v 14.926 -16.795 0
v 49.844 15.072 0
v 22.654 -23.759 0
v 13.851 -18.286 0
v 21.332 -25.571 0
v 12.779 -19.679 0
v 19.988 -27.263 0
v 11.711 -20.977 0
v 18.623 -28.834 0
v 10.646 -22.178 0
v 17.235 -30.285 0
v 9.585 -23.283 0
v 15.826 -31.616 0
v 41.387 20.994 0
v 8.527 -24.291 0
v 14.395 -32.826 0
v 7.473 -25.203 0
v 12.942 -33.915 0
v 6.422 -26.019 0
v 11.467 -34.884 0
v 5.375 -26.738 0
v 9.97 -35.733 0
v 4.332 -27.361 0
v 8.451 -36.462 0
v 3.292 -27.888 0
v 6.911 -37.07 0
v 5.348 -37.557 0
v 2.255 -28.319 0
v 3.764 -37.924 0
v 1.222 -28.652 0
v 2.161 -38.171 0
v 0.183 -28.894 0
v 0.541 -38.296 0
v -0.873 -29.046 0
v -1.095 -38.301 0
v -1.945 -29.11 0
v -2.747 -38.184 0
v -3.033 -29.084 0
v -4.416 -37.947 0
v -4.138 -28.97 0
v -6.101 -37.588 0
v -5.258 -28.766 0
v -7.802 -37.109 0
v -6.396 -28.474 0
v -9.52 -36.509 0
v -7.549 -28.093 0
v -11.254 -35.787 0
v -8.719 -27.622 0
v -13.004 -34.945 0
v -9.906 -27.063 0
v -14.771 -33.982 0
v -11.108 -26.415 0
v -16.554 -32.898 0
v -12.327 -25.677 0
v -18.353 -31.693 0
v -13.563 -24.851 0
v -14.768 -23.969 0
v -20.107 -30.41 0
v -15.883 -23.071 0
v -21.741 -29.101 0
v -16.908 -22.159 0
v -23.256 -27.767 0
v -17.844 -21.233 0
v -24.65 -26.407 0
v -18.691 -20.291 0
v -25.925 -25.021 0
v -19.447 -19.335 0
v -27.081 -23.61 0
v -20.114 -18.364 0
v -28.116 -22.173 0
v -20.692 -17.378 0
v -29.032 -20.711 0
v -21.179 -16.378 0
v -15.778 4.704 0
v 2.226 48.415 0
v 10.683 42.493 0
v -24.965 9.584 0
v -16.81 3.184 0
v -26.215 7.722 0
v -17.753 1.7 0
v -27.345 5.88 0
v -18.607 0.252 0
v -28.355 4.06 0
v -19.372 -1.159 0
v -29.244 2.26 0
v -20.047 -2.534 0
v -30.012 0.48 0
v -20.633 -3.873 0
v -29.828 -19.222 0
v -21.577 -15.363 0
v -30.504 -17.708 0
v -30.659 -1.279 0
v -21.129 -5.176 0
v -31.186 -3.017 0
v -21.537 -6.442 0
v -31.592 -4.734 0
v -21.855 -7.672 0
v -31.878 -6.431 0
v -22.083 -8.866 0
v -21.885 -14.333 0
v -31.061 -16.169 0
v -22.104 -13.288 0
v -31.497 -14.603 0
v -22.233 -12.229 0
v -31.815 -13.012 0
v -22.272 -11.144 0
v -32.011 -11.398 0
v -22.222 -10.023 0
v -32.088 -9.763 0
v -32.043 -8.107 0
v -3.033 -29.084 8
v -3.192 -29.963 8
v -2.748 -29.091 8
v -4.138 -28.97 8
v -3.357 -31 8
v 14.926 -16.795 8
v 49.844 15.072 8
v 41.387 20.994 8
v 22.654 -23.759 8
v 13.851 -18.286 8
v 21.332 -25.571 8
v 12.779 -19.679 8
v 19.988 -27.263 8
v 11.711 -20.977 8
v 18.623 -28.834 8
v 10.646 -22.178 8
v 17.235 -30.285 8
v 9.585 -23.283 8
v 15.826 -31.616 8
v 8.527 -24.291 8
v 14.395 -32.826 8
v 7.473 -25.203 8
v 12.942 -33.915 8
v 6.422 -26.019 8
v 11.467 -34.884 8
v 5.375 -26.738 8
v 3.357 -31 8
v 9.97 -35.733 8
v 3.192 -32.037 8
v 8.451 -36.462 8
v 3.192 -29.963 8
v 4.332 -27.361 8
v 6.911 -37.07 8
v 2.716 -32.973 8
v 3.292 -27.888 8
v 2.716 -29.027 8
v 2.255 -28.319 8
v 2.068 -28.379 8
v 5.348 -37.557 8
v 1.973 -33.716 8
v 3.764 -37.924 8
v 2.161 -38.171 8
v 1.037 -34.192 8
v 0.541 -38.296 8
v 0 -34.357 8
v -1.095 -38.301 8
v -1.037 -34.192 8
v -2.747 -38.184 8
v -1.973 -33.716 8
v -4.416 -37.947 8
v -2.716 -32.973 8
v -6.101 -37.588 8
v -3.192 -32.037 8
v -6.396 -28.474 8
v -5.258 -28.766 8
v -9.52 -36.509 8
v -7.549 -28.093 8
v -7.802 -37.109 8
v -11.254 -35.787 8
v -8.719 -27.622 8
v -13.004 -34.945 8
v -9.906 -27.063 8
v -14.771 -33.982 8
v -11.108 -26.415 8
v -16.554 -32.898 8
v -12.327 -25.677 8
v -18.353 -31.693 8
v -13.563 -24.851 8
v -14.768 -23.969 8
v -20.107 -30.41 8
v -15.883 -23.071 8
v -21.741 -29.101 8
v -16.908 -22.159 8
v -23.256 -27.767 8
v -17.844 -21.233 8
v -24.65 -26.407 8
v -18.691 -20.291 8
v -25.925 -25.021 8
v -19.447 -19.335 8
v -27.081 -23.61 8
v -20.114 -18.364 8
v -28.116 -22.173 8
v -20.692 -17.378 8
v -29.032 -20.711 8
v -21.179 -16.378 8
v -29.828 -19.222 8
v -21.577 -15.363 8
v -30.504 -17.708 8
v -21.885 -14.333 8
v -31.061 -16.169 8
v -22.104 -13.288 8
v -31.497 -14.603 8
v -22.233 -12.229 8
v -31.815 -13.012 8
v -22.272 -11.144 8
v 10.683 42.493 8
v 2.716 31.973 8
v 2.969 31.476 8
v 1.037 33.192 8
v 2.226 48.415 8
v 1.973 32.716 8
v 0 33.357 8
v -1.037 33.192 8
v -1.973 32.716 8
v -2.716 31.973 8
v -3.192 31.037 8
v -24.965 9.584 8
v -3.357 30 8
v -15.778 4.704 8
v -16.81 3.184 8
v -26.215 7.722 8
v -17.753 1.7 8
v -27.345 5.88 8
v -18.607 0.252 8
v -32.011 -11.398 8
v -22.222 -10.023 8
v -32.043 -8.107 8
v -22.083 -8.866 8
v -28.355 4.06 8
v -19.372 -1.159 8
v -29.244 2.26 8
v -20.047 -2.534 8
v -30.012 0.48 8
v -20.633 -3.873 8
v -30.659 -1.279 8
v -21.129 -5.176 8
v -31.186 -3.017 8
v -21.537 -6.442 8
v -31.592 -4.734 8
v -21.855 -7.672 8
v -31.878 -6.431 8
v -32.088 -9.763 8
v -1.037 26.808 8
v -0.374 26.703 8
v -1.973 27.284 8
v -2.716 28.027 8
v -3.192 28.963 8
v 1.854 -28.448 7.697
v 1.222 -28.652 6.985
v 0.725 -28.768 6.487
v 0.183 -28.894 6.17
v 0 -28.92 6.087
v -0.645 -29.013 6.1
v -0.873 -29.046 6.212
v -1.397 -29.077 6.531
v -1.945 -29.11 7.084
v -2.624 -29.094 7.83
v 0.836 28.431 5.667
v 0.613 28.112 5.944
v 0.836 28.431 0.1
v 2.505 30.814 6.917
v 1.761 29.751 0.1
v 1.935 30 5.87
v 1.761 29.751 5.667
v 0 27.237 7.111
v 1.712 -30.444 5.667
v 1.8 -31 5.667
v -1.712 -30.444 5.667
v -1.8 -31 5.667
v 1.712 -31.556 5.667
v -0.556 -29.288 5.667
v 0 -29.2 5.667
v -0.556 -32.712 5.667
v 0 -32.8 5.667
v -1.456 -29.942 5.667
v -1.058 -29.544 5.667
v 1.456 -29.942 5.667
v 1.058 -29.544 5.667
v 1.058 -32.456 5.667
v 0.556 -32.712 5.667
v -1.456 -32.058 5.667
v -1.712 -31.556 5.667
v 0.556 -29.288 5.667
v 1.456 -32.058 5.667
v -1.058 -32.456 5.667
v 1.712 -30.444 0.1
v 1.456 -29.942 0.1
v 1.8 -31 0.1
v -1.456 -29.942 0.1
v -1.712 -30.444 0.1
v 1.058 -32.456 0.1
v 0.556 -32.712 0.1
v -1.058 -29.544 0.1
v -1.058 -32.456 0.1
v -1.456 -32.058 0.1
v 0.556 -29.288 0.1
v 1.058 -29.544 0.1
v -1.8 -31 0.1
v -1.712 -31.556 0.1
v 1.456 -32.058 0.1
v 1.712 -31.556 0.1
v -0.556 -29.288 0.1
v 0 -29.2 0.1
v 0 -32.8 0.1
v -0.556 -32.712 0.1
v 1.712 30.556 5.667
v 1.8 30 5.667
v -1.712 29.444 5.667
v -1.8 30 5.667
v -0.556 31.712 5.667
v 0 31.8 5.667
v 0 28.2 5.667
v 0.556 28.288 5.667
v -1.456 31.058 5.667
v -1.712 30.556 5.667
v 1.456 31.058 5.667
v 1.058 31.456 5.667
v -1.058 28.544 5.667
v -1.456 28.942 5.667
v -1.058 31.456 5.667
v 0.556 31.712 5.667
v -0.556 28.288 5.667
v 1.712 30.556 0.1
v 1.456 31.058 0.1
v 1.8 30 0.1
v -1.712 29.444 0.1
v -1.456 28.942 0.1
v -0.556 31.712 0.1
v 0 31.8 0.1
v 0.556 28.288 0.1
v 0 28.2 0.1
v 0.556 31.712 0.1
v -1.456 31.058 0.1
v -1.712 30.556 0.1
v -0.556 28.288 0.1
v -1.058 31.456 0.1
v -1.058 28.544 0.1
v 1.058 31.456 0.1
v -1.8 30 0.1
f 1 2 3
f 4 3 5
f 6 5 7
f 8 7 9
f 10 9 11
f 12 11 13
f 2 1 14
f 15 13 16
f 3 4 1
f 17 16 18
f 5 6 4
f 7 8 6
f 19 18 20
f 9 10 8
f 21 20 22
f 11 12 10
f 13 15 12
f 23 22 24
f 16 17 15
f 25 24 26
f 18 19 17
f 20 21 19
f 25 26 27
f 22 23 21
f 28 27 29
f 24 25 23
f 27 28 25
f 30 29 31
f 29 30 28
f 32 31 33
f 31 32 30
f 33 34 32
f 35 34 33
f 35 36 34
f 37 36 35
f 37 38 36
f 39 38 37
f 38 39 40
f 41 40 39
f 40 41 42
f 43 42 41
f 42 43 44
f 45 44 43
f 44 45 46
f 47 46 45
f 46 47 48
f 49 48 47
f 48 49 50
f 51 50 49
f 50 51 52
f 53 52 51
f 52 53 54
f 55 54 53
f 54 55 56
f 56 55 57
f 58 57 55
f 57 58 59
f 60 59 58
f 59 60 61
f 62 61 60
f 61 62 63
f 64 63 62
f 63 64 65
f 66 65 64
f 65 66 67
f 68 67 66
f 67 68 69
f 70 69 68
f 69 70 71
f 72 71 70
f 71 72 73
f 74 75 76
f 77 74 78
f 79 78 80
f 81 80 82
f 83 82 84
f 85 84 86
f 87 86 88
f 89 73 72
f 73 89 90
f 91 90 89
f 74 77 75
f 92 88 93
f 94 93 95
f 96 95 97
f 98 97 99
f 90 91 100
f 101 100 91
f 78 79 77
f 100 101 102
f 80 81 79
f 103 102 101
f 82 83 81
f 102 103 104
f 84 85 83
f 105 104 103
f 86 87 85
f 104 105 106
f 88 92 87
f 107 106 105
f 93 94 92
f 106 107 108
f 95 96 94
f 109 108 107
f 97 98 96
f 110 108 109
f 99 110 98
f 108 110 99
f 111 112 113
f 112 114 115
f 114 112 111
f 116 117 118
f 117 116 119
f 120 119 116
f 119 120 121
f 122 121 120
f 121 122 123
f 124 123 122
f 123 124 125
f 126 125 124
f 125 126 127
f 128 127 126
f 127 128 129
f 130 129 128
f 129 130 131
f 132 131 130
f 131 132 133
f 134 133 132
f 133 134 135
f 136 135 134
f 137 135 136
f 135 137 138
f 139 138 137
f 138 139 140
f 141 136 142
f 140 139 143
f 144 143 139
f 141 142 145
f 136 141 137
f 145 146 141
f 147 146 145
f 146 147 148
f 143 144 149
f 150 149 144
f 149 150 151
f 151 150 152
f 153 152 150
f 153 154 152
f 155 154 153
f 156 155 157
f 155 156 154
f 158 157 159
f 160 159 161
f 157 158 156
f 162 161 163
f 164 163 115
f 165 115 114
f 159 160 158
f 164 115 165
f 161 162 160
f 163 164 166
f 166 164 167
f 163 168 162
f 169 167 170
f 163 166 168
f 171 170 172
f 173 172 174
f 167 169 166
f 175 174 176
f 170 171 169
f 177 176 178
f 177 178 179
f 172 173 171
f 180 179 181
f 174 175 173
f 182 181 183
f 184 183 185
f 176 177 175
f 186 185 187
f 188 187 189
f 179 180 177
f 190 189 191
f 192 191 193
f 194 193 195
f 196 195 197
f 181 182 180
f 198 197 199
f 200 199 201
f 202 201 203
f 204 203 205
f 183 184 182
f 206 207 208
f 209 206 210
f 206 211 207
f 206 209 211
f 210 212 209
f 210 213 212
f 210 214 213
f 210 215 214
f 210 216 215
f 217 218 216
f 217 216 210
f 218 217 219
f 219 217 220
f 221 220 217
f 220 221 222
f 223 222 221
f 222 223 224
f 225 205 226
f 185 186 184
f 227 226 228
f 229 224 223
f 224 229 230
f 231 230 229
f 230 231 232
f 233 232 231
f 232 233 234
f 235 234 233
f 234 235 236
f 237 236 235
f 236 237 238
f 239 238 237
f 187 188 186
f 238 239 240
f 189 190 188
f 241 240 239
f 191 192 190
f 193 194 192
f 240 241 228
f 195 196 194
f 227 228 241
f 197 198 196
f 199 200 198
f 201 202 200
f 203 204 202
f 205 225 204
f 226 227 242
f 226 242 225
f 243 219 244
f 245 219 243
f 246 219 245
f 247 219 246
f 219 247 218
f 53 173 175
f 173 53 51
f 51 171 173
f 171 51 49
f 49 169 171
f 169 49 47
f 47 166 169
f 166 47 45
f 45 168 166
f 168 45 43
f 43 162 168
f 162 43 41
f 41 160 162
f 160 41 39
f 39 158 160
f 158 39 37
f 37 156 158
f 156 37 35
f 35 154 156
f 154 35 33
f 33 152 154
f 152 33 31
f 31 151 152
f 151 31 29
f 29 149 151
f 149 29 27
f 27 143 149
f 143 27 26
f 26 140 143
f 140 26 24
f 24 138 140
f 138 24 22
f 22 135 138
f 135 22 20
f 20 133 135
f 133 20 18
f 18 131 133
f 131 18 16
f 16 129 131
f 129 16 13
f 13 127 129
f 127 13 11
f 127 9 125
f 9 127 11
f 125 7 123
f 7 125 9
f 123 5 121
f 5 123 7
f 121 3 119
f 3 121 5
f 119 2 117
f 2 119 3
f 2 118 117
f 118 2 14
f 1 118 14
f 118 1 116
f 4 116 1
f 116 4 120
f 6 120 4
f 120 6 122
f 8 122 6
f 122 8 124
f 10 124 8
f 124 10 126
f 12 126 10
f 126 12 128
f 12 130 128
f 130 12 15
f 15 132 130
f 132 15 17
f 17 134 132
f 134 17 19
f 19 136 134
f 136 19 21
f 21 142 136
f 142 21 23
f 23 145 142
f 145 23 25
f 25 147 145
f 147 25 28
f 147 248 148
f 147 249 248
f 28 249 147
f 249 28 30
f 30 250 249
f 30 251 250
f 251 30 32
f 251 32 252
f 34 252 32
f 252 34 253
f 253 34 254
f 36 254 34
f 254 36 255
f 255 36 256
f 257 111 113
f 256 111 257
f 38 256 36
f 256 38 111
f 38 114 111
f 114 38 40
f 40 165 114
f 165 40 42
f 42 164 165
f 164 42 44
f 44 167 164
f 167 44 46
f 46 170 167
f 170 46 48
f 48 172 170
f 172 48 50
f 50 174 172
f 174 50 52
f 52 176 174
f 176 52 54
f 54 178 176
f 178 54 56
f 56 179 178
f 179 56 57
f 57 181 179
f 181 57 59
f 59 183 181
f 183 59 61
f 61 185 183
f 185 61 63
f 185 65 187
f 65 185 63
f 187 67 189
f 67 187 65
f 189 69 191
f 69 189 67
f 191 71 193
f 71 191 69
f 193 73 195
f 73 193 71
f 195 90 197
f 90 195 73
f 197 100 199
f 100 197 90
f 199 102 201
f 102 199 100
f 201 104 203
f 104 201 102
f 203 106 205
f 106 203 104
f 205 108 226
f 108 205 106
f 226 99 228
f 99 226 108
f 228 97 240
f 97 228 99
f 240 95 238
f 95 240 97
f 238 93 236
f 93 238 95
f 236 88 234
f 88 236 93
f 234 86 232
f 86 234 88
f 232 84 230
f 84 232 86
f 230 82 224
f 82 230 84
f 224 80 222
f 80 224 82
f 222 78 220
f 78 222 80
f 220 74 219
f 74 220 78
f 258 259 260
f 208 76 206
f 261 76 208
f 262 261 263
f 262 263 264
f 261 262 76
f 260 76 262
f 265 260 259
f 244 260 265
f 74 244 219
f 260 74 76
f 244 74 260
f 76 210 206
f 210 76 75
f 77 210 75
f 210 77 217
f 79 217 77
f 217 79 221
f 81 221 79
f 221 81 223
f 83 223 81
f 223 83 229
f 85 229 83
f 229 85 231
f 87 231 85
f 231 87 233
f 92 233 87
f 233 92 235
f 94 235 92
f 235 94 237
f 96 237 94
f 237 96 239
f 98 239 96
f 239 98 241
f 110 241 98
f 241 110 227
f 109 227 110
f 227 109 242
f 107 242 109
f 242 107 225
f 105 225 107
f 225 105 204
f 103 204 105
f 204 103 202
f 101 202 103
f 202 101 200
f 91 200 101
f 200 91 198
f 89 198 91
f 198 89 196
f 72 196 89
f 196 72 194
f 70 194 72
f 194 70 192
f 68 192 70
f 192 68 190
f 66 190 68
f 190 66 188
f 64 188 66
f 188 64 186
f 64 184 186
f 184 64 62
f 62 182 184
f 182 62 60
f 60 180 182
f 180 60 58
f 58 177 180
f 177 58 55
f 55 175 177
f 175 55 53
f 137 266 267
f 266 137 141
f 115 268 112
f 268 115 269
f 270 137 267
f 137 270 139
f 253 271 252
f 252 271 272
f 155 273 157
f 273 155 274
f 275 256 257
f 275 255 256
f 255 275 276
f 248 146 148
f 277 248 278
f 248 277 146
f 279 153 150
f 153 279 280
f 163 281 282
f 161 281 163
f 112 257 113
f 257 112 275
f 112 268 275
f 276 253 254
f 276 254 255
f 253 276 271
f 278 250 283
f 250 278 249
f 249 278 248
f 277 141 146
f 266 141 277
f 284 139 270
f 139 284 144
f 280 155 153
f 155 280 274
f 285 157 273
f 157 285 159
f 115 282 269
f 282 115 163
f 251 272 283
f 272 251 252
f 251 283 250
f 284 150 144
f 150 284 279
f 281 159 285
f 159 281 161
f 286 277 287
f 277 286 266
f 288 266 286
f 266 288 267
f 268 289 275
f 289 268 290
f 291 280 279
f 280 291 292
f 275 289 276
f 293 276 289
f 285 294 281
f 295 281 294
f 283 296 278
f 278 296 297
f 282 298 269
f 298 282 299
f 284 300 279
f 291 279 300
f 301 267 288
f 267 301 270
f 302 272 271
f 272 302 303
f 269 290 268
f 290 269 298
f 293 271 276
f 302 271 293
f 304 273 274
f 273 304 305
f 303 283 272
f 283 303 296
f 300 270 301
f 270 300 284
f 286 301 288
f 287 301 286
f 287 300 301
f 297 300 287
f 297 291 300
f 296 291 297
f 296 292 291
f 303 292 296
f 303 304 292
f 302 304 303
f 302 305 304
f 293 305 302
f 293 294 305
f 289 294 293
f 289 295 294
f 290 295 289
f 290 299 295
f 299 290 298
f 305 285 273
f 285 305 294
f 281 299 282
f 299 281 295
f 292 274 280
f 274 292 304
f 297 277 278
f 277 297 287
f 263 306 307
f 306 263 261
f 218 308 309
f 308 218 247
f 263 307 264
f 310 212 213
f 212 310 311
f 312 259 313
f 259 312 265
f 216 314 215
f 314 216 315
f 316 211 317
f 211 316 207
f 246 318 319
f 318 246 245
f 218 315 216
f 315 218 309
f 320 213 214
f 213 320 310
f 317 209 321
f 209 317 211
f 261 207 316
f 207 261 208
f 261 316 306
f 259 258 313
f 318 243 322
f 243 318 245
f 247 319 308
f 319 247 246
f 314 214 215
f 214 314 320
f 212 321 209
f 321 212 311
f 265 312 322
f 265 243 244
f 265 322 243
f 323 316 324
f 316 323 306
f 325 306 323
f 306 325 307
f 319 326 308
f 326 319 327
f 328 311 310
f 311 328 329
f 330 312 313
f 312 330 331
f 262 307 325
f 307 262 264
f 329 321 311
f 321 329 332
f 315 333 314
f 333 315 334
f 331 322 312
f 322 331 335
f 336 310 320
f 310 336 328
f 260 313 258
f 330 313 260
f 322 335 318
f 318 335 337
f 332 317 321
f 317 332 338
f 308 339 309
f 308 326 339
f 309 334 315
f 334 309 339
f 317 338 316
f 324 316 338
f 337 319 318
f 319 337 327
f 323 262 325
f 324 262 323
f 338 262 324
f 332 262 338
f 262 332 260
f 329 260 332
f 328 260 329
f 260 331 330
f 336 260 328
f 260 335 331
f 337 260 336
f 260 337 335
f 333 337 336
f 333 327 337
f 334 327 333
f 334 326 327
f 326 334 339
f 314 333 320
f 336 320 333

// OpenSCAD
// Street Numbers for 3D printing
// Charles Tilford, 2019
// License: CC BY-NC-SA 4.0
//   https://creativecommons.org/licenses/by-nc-sa/4.0/

char="U";     // The number/letter to print

// Units are in mm, except for height of letter

// How many inches high should letter be?
inchesHigh=3;
// How thick/deep should letter be (mm)?
depth=8;

// Character coordinates just center the letter
charX=-35;    // Character X coord
charY=-35;    // Character Y coord
topScrew=30;  // Top screw Y coord
botScrew=-31; // Bottom screw Y coord
height=8;     // Thickness of character
// Screw dimensions. Default presumes
// #6 sheet metal screw
screwWid=3.6; // Width of screw shaft
screwTop=6.78;// Width of screw head
screwCon=5.08;// Height of head 'cone'

// Font to print in. Your system needs this
// installed, of course. If changed the hole
// positions almost certainly need to be
// changed, and maybe charX/charY.
fName="Open Sans Extrabold";
// https://fonts.google.com/specimen/Open+Sans
// Designer: Steve Matteson

// Thin floor below holes. My printer was
// struggling to have the hole 'border' stick
// to the stage. Just drill/screw thru it.
holeFloor=0.1; 

// ==========================================
// ===== All values below are auto-calculated
// ==========================================

// Scaled values
scaleFactor=inchesHigh / 3;
cX=charX * scaleFactor;
cY=charY * scaleFactor;
tS=topScrew * scaleFactor;
bS=botScrew * scaleFactor;
// Where do we start drawing screw head cone?
oS=depth - (screwCon-.05);

difference() {
  // We use difference() to punch out the screw holes
  // in the character
    
  // The character itself, 8mm thick
  rotate(a=-35)
  translate([cX,cY,0])
    linear_extrude(height=depth, scale=1)
    text(char, size=(75*scaleFactor),
         $fn=100, font=fName);
    
  // Bottom screw hole
  translate([0,bS,oS]) color("red")
    cylinder(h=screwCon, d2=screwTop,
             d1=0, $fn=20);
   translate([0,bS,holeFloor])
    cylinder(h=20, d=screwWid, $fn=20);
    
  // Top screw hole
  translate([0,tS,oS]) color("red")
    cylinder(h=screwCon, d2=screwTop,
             d1=0, $fn=20);
  translate([0,tS,holeFloor])
    cylinder(h=20, d=screwWid, $fn=20);
}

// Colors are just to aid visualization of
// void spaces. $fn is "featuer number", ie how
// many polygons are devoted to object. The values
// above should be near your printing limit anyway.

// Developed in OpenSCAD
//    https://www.openscad.org/
